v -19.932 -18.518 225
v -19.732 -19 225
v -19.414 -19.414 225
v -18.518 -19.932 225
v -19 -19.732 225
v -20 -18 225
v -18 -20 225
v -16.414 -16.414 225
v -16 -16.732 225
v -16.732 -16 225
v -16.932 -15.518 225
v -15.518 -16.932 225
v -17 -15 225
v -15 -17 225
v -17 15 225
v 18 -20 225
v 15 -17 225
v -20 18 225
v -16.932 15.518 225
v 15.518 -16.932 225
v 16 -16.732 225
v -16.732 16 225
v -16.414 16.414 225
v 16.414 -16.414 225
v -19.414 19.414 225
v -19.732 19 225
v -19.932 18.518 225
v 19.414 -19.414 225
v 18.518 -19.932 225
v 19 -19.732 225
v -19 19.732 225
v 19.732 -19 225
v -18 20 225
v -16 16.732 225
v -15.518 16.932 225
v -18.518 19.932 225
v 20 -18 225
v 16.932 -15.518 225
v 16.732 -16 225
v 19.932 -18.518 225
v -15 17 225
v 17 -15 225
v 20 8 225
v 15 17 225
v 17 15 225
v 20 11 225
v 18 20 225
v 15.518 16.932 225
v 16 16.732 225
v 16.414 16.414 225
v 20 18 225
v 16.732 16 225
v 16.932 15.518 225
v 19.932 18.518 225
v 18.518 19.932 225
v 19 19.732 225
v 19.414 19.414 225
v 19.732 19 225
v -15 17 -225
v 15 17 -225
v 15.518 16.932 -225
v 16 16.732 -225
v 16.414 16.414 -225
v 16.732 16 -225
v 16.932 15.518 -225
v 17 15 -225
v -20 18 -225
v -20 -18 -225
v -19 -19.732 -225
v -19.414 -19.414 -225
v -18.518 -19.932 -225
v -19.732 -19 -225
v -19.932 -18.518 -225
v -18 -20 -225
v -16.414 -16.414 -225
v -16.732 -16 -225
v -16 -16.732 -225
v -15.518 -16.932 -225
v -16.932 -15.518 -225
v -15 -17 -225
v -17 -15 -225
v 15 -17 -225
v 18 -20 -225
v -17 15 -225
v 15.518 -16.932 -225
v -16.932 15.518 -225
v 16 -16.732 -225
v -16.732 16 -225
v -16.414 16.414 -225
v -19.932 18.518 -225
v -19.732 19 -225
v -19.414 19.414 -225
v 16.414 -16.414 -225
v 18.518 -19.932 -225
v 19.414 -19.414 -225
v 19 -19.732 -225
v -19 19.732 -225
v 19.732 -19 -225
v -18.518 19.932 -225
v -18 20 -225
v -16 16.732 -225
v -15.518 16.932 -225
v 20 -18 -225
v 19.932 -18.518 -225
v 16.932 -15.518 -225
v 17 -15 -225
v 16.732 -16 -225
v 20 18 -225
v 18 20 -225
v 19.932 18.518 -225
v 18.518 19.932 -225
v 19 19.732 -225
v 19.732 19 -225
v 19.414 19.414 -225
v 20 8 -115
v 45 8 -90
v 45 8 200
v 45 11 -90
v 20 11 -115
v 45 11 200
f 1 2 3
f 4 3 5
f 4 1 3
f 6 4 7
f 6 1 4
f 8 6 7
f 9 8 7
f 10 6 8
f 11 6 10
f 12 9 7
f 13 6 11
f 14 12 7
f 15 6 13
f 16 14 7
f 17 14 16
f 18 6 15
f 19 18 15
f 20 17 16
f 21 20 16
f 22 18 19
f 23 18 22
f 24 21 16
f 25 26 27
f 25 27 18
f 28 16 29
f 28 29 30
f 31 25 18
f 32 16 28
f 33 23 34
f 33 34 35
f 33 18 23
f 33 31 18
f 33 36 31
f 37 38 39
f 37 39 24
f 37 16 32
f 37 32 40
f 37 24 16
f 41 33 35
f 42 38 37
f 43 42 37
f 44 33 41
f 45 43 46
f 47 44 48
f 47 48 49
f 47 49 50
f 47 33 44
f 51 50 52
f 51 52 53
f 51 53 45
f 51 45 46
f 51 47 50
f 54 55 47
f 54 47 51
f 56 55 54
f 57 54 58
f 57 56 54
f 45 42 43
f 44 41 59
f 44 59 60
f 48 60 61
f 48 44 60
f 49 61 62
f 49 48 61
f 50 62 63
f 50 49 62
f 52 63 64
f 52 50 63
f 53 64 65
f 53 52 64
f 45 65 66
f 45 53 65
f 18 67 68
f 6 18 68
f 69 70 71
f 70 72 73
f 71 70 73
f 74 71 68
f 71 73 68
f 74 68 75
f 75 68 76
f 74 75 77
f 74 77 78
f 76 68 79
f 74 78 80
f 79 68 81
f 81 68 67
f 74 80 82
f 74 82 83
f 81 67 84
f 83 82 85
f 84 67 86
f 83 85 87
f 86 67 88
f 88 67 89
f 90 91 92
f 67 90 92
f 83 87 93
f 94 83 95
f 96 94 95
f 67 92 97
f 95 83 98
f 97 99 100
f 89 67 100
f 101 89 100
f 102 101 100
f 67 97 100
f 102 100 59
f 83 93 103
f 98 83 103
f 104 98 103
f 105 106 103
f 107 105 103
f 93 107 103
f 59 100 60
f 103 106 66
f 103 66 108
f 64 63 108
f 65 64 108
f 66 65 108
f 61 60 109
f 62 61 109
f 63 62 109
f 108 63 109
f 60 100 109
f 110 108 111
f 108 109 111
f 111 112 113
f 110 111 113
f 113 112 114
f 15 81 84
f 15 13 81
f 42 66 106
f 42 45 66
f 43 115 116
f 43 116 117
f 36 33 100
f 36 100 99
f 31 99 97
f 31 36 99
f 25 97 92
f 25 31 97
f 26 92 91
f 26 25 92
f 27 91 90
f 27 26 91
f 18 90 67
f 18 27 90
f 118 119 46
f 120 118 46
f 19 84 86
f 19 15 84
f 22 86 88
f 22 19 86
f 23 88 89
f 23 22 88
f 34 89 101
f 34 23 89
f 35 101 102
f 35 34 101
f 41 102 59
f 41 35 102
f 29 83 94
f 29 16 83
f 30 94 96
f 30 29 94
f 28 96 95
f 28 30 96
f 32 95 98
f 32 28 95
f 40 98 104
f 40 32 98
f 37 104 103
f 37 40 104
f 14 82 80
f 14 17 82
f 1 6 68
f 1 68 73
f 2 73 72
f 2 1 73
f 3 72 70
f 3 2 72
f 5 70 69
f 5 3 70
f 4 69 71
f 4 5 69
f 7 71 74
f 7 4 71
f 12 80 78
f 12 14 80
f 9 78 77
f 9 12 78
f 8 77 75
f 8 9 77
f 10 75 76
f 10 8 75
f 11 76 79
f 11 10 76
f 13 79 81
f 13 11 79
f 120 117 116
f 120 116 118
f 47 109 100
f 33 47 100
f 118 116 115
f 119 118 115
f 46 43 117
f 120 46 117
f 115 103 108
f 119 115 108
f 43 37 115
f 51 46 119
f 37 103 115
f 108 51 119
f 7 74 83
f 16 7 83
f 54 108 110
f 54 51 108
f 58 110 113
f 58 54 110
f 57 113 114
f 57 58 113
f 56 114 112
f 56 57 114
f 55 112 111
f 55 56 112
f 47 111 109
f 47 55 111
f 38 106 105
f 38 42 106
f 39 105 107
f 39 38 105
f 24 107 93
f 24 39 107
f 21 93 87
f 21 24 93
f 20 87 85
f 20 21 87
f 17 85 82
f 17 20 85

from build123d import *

# Parameters (mm, degrees)
F1_DEPTH = 225
F2_W     = 3
F2_H     = 340
F3_DEPTH = 25
F5_DEPTH = 12.001


with BuildPart() as f1:
    # F0 (on Top) → F1 (new body, symmetric)
    with BuildSketch(Plane.XY):
        with BuildLine():
            ThreePointArc((20, 18), (19.414214, 19.414214), (18, 20))
            Line((18, 20), (-18, 20))
            ThreePointArc((-18, 20), (-19.414214, 19.414214), (-20, 18))
            Line((-20, 18), (-20, -18))
            ThreePointArc((-20, -18), (-19.414214, -19.414214), (-18, -20))
            Line((-18, -20), (18, -20))
            ThreePointArc((18, -20), (19.414214, -19.414214), (20, -18))
            Line((20, -18), (20, 18))
        make_face()
        with BuildLine():
            Line((-15, 17), (15, 17))
            ThreePointArc((15, 17), (16.414214, 16.414214), (17, 15))
            Line((17, 15), (17, -15))
            ThreePointArc((17, -15), (16.414214, -16.414214), (15, -17))
            Line((15, -17), (-15, -17))
            ThreePointArc((-15, -17), (-16.414214, -16.414214), (-17, -15))
            Line((-17, -15), (-17, 15))
            ThreePointArc((-17, 15), (-16.414214, 16.414214), (-15, 17))
        make_face(mode=Mode.SUBTRACT)
    extrude(amount=F1_DEPTH, both=True)

    # F2 (on face) → F3 (join)
    with BuildSketch(Plane.YZ.offset(20)):
        with Locations((9.5, 55)):
            Rectangle(F2_W, F2_H)
    extrude(amount=F3_DEPTH)

    # F4 (on face) → F5 (cut, through all)
    with BuildSketch(Plane.XZ.offset(-8)):
        Polygon((45, 225), (20, 225), (45, 200), align=None)
        Polygon((45, -115), (45, -90), (20, -115), align=None)
    extrude(amount=-F5_DEPTH, mode=Mode.SUBTRACT)


solid = f1.part
